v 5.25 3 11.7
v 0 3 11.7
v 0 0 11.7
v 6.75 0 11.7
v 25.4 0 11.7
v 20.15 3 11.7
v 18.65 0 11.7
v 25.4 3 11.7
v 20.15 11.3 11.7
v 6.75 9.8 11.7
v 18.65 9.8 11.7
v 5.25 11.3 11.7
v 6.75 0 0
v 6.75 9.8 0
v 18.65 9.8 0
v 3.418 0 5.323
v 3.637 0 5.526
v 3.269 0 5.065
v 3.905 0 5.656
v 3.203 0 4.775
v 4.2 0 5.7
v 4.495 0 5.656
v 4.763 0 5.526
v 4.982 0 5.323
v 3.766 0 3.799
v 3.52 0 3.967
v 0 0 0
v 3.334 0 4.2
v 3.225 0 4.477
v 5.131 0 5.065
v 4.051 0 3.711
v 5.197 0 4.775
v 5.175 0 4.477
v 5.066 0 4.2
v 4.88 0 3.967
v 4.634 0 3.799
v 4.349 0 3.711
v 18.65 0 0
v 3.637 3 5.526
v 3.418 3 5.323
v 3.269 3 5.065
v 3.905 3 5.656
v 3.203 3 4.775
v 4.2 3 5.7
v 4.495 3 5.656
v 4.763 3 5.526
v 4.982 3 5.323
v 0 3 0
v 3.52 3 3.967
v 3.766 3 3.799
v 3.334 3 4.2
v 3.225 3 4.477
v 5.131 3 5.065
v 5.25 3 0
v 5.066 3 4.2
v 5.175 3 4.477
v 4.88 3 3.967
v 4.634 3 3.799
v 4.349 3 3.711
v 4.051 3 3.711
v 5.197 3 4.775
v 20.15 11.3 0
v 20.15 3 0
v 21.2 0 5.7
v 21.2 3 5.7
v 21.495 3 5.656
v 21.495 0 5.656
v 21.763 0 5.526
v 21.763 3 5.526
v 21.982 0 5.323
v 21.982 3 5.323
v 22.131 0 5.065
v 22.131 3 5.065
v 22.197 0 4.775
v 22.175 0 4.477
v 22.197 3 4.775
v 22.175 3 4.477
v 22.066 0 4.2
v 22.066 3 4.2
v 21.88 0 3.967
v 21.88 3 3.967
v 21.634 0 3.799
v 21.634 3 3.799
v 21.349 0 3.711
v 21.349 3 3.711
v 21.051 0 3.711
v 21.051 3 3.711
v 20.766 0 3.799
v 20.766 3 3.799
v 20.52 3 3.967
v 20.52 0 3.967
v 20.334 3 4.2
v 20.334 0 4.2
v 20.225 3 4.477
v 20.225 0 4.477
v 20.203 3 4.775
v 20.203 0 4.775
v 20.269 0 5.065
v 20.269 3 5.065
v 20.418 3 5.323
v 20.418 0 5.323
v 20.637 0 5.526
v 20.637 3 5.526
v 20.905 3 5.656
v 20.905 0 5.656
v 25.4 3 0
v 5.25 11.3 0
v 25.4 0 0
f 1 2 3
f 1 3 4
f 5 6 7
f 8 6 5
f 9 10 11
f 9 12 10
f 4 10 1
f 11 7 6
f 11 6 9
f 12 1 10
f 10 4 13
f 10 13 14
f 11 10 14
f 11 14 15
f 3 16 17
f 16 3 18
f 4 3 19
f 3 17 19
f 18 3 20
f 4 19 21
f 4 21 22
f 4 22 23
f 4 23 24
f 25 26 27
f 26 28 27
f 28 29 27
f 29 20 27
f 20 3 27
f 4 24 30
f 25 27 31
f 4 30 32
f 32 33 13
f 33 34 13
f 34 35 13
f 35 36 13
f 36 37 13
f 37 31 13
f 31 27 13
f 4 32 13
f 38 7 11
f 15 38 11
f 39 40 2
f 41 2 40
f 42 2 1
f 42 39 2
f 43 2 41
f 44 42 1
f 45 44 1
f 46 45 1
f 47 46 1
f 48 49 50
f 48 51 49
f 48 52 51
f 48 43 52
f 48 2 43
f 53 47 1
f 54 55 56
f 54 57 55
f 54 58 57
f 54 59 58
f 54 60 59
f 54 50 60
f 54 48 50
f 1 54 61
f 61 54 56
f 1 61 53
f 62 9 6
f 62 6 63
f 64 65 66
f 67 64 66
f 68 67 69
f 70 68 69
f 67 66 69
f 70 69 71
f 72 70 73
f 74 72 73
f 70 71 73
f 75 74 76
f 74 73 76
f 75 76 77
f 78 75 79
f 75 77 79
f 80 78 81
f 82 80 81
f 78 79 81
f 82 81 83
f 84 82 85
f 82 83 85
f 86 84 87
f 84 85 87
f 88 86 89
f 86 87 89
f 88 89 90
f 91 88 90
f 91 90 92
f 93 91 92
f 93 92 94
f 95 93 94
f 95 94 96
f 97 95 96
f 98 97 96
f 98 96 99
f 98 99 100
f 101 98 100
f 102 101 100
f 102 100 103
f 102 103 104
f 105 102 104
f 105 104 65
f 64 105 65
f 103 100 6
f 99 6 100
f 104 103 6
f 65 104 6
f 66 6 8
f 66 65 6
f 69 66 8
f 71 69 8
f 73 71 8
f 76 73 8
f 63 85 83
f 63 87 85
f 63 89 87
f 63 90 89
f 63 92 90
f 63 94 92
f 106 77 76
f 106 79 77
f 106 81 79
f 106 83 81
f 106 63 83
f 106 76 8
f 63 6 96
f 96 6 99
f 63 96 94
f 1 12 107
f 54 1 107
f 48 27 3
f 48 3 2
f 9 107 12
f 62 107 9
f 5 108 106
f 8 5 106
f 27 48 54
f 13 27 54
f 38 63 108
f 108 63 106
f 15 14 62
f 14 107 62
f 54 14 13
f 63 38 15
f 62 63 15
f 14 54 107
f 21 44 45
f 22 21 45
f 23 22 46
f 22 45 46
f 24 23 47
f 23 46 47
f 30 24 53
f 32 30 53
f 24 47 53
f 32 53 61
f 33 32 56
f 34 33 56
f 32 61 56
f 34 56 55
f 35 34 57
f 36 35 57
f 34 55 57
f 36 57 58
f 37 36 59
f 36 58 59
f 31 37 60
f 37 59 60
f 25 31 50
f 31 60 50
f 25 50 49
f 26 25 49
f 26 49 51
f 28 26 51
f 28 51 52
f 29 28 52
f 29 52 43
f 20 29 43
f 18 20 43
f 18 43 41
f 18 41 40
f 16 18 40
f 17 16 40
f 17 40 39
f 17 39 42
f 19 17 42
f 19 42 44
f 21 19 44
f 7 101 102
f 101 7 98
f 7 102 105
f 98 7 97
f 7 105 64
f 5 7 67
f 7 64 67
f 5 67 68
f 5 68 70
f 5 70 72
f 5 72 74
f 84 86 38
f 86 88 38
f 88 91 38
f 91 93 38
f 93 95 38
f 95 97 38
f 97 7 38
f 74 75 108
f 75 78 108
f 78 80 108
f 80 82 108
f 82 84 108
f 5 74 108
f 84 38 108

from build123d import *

# Parameters (mm, degrees)
CROQUIS1_W              = 25.4
CROQUIS1_H              = 11.3
SALIENTE_EXTRUIR1_DEPTH = 11.7
CROQUIS2_W              = 5.25
CROQUIS2_H              = 11.7
CORTAR_EXTRUIR1_DEPTH   = 8.3
CROQUIS3_W              = 11.9
CROQUIS3_H              = 9.8
CORTAR_EXTRUIR2_DEPTH   = 31.161896492
CROQUIS4_R              = 1
CORTAR_EXTRUIR3_DEPTH   = 30.170875887


with BuildPart() as part:
    # Croquis1 → Saliente-Extruir1 (new body)
    with BuildSketch(Plane.XY):
        with Locations((12.7, 5.65)):
            Rectangle(CROQUIS1_W, CROQUIS1_H)
    extrude(amount=SALIENTE_EXTRUIR1_DEPTH)

    # Croquis2 → Cortar-Extruir1 (cut)
    with BuildSketch(Plane(origin=(0, 11.3, 0), x_dir=(1, 0, 0), z_dir=(0, 1, 0))):
        with Locations((2.625, -5.85)):
            Rectangle(CROQUIS2_W, CROQUIS2_H)
        with Locations((22.775, -5.85)):
            Rectangle(CROQUIS2_W, CROQUIS2_H)
    extrude(amount=-CORTAR_EXTRUIR1_DEPTH, mode=Mode.SUBTRACT)

    # Croquis3 → Cortar-Extruir2 (cut, through all)
    with BuildSketch(Plane.XY.offset(11.7)):
        with Locations((12.7, 4.9)):
            Rectangle(CROQUIS3_W, CROQUIS3_H)
    extrude(amount=-CORTAR_EXTRUIR2_DEPTH, mode=Mode.SUBTRACT)

    # Croquis4 → Cortar-Extruir3 (cut, through all)
    with BuildSketch(Plane(origin=(0, 3, 0), x_dir=(1, 0, 0), z_dir=(0, 1, 0))):
        with Locations(Location((21.2, -4.7, 0), (0, 0, 270))):
            Circle(CROQUIS4_R)
        with Locations(Location((4.2, -4.7, 0), (0, 0, 270))):
            Circle(CROQUIS4_R)
    extrude(amount=-CORTAR_EXTRUIR3_DEPTH, mode=Mode.SUBTRACT)


solid = part.part
